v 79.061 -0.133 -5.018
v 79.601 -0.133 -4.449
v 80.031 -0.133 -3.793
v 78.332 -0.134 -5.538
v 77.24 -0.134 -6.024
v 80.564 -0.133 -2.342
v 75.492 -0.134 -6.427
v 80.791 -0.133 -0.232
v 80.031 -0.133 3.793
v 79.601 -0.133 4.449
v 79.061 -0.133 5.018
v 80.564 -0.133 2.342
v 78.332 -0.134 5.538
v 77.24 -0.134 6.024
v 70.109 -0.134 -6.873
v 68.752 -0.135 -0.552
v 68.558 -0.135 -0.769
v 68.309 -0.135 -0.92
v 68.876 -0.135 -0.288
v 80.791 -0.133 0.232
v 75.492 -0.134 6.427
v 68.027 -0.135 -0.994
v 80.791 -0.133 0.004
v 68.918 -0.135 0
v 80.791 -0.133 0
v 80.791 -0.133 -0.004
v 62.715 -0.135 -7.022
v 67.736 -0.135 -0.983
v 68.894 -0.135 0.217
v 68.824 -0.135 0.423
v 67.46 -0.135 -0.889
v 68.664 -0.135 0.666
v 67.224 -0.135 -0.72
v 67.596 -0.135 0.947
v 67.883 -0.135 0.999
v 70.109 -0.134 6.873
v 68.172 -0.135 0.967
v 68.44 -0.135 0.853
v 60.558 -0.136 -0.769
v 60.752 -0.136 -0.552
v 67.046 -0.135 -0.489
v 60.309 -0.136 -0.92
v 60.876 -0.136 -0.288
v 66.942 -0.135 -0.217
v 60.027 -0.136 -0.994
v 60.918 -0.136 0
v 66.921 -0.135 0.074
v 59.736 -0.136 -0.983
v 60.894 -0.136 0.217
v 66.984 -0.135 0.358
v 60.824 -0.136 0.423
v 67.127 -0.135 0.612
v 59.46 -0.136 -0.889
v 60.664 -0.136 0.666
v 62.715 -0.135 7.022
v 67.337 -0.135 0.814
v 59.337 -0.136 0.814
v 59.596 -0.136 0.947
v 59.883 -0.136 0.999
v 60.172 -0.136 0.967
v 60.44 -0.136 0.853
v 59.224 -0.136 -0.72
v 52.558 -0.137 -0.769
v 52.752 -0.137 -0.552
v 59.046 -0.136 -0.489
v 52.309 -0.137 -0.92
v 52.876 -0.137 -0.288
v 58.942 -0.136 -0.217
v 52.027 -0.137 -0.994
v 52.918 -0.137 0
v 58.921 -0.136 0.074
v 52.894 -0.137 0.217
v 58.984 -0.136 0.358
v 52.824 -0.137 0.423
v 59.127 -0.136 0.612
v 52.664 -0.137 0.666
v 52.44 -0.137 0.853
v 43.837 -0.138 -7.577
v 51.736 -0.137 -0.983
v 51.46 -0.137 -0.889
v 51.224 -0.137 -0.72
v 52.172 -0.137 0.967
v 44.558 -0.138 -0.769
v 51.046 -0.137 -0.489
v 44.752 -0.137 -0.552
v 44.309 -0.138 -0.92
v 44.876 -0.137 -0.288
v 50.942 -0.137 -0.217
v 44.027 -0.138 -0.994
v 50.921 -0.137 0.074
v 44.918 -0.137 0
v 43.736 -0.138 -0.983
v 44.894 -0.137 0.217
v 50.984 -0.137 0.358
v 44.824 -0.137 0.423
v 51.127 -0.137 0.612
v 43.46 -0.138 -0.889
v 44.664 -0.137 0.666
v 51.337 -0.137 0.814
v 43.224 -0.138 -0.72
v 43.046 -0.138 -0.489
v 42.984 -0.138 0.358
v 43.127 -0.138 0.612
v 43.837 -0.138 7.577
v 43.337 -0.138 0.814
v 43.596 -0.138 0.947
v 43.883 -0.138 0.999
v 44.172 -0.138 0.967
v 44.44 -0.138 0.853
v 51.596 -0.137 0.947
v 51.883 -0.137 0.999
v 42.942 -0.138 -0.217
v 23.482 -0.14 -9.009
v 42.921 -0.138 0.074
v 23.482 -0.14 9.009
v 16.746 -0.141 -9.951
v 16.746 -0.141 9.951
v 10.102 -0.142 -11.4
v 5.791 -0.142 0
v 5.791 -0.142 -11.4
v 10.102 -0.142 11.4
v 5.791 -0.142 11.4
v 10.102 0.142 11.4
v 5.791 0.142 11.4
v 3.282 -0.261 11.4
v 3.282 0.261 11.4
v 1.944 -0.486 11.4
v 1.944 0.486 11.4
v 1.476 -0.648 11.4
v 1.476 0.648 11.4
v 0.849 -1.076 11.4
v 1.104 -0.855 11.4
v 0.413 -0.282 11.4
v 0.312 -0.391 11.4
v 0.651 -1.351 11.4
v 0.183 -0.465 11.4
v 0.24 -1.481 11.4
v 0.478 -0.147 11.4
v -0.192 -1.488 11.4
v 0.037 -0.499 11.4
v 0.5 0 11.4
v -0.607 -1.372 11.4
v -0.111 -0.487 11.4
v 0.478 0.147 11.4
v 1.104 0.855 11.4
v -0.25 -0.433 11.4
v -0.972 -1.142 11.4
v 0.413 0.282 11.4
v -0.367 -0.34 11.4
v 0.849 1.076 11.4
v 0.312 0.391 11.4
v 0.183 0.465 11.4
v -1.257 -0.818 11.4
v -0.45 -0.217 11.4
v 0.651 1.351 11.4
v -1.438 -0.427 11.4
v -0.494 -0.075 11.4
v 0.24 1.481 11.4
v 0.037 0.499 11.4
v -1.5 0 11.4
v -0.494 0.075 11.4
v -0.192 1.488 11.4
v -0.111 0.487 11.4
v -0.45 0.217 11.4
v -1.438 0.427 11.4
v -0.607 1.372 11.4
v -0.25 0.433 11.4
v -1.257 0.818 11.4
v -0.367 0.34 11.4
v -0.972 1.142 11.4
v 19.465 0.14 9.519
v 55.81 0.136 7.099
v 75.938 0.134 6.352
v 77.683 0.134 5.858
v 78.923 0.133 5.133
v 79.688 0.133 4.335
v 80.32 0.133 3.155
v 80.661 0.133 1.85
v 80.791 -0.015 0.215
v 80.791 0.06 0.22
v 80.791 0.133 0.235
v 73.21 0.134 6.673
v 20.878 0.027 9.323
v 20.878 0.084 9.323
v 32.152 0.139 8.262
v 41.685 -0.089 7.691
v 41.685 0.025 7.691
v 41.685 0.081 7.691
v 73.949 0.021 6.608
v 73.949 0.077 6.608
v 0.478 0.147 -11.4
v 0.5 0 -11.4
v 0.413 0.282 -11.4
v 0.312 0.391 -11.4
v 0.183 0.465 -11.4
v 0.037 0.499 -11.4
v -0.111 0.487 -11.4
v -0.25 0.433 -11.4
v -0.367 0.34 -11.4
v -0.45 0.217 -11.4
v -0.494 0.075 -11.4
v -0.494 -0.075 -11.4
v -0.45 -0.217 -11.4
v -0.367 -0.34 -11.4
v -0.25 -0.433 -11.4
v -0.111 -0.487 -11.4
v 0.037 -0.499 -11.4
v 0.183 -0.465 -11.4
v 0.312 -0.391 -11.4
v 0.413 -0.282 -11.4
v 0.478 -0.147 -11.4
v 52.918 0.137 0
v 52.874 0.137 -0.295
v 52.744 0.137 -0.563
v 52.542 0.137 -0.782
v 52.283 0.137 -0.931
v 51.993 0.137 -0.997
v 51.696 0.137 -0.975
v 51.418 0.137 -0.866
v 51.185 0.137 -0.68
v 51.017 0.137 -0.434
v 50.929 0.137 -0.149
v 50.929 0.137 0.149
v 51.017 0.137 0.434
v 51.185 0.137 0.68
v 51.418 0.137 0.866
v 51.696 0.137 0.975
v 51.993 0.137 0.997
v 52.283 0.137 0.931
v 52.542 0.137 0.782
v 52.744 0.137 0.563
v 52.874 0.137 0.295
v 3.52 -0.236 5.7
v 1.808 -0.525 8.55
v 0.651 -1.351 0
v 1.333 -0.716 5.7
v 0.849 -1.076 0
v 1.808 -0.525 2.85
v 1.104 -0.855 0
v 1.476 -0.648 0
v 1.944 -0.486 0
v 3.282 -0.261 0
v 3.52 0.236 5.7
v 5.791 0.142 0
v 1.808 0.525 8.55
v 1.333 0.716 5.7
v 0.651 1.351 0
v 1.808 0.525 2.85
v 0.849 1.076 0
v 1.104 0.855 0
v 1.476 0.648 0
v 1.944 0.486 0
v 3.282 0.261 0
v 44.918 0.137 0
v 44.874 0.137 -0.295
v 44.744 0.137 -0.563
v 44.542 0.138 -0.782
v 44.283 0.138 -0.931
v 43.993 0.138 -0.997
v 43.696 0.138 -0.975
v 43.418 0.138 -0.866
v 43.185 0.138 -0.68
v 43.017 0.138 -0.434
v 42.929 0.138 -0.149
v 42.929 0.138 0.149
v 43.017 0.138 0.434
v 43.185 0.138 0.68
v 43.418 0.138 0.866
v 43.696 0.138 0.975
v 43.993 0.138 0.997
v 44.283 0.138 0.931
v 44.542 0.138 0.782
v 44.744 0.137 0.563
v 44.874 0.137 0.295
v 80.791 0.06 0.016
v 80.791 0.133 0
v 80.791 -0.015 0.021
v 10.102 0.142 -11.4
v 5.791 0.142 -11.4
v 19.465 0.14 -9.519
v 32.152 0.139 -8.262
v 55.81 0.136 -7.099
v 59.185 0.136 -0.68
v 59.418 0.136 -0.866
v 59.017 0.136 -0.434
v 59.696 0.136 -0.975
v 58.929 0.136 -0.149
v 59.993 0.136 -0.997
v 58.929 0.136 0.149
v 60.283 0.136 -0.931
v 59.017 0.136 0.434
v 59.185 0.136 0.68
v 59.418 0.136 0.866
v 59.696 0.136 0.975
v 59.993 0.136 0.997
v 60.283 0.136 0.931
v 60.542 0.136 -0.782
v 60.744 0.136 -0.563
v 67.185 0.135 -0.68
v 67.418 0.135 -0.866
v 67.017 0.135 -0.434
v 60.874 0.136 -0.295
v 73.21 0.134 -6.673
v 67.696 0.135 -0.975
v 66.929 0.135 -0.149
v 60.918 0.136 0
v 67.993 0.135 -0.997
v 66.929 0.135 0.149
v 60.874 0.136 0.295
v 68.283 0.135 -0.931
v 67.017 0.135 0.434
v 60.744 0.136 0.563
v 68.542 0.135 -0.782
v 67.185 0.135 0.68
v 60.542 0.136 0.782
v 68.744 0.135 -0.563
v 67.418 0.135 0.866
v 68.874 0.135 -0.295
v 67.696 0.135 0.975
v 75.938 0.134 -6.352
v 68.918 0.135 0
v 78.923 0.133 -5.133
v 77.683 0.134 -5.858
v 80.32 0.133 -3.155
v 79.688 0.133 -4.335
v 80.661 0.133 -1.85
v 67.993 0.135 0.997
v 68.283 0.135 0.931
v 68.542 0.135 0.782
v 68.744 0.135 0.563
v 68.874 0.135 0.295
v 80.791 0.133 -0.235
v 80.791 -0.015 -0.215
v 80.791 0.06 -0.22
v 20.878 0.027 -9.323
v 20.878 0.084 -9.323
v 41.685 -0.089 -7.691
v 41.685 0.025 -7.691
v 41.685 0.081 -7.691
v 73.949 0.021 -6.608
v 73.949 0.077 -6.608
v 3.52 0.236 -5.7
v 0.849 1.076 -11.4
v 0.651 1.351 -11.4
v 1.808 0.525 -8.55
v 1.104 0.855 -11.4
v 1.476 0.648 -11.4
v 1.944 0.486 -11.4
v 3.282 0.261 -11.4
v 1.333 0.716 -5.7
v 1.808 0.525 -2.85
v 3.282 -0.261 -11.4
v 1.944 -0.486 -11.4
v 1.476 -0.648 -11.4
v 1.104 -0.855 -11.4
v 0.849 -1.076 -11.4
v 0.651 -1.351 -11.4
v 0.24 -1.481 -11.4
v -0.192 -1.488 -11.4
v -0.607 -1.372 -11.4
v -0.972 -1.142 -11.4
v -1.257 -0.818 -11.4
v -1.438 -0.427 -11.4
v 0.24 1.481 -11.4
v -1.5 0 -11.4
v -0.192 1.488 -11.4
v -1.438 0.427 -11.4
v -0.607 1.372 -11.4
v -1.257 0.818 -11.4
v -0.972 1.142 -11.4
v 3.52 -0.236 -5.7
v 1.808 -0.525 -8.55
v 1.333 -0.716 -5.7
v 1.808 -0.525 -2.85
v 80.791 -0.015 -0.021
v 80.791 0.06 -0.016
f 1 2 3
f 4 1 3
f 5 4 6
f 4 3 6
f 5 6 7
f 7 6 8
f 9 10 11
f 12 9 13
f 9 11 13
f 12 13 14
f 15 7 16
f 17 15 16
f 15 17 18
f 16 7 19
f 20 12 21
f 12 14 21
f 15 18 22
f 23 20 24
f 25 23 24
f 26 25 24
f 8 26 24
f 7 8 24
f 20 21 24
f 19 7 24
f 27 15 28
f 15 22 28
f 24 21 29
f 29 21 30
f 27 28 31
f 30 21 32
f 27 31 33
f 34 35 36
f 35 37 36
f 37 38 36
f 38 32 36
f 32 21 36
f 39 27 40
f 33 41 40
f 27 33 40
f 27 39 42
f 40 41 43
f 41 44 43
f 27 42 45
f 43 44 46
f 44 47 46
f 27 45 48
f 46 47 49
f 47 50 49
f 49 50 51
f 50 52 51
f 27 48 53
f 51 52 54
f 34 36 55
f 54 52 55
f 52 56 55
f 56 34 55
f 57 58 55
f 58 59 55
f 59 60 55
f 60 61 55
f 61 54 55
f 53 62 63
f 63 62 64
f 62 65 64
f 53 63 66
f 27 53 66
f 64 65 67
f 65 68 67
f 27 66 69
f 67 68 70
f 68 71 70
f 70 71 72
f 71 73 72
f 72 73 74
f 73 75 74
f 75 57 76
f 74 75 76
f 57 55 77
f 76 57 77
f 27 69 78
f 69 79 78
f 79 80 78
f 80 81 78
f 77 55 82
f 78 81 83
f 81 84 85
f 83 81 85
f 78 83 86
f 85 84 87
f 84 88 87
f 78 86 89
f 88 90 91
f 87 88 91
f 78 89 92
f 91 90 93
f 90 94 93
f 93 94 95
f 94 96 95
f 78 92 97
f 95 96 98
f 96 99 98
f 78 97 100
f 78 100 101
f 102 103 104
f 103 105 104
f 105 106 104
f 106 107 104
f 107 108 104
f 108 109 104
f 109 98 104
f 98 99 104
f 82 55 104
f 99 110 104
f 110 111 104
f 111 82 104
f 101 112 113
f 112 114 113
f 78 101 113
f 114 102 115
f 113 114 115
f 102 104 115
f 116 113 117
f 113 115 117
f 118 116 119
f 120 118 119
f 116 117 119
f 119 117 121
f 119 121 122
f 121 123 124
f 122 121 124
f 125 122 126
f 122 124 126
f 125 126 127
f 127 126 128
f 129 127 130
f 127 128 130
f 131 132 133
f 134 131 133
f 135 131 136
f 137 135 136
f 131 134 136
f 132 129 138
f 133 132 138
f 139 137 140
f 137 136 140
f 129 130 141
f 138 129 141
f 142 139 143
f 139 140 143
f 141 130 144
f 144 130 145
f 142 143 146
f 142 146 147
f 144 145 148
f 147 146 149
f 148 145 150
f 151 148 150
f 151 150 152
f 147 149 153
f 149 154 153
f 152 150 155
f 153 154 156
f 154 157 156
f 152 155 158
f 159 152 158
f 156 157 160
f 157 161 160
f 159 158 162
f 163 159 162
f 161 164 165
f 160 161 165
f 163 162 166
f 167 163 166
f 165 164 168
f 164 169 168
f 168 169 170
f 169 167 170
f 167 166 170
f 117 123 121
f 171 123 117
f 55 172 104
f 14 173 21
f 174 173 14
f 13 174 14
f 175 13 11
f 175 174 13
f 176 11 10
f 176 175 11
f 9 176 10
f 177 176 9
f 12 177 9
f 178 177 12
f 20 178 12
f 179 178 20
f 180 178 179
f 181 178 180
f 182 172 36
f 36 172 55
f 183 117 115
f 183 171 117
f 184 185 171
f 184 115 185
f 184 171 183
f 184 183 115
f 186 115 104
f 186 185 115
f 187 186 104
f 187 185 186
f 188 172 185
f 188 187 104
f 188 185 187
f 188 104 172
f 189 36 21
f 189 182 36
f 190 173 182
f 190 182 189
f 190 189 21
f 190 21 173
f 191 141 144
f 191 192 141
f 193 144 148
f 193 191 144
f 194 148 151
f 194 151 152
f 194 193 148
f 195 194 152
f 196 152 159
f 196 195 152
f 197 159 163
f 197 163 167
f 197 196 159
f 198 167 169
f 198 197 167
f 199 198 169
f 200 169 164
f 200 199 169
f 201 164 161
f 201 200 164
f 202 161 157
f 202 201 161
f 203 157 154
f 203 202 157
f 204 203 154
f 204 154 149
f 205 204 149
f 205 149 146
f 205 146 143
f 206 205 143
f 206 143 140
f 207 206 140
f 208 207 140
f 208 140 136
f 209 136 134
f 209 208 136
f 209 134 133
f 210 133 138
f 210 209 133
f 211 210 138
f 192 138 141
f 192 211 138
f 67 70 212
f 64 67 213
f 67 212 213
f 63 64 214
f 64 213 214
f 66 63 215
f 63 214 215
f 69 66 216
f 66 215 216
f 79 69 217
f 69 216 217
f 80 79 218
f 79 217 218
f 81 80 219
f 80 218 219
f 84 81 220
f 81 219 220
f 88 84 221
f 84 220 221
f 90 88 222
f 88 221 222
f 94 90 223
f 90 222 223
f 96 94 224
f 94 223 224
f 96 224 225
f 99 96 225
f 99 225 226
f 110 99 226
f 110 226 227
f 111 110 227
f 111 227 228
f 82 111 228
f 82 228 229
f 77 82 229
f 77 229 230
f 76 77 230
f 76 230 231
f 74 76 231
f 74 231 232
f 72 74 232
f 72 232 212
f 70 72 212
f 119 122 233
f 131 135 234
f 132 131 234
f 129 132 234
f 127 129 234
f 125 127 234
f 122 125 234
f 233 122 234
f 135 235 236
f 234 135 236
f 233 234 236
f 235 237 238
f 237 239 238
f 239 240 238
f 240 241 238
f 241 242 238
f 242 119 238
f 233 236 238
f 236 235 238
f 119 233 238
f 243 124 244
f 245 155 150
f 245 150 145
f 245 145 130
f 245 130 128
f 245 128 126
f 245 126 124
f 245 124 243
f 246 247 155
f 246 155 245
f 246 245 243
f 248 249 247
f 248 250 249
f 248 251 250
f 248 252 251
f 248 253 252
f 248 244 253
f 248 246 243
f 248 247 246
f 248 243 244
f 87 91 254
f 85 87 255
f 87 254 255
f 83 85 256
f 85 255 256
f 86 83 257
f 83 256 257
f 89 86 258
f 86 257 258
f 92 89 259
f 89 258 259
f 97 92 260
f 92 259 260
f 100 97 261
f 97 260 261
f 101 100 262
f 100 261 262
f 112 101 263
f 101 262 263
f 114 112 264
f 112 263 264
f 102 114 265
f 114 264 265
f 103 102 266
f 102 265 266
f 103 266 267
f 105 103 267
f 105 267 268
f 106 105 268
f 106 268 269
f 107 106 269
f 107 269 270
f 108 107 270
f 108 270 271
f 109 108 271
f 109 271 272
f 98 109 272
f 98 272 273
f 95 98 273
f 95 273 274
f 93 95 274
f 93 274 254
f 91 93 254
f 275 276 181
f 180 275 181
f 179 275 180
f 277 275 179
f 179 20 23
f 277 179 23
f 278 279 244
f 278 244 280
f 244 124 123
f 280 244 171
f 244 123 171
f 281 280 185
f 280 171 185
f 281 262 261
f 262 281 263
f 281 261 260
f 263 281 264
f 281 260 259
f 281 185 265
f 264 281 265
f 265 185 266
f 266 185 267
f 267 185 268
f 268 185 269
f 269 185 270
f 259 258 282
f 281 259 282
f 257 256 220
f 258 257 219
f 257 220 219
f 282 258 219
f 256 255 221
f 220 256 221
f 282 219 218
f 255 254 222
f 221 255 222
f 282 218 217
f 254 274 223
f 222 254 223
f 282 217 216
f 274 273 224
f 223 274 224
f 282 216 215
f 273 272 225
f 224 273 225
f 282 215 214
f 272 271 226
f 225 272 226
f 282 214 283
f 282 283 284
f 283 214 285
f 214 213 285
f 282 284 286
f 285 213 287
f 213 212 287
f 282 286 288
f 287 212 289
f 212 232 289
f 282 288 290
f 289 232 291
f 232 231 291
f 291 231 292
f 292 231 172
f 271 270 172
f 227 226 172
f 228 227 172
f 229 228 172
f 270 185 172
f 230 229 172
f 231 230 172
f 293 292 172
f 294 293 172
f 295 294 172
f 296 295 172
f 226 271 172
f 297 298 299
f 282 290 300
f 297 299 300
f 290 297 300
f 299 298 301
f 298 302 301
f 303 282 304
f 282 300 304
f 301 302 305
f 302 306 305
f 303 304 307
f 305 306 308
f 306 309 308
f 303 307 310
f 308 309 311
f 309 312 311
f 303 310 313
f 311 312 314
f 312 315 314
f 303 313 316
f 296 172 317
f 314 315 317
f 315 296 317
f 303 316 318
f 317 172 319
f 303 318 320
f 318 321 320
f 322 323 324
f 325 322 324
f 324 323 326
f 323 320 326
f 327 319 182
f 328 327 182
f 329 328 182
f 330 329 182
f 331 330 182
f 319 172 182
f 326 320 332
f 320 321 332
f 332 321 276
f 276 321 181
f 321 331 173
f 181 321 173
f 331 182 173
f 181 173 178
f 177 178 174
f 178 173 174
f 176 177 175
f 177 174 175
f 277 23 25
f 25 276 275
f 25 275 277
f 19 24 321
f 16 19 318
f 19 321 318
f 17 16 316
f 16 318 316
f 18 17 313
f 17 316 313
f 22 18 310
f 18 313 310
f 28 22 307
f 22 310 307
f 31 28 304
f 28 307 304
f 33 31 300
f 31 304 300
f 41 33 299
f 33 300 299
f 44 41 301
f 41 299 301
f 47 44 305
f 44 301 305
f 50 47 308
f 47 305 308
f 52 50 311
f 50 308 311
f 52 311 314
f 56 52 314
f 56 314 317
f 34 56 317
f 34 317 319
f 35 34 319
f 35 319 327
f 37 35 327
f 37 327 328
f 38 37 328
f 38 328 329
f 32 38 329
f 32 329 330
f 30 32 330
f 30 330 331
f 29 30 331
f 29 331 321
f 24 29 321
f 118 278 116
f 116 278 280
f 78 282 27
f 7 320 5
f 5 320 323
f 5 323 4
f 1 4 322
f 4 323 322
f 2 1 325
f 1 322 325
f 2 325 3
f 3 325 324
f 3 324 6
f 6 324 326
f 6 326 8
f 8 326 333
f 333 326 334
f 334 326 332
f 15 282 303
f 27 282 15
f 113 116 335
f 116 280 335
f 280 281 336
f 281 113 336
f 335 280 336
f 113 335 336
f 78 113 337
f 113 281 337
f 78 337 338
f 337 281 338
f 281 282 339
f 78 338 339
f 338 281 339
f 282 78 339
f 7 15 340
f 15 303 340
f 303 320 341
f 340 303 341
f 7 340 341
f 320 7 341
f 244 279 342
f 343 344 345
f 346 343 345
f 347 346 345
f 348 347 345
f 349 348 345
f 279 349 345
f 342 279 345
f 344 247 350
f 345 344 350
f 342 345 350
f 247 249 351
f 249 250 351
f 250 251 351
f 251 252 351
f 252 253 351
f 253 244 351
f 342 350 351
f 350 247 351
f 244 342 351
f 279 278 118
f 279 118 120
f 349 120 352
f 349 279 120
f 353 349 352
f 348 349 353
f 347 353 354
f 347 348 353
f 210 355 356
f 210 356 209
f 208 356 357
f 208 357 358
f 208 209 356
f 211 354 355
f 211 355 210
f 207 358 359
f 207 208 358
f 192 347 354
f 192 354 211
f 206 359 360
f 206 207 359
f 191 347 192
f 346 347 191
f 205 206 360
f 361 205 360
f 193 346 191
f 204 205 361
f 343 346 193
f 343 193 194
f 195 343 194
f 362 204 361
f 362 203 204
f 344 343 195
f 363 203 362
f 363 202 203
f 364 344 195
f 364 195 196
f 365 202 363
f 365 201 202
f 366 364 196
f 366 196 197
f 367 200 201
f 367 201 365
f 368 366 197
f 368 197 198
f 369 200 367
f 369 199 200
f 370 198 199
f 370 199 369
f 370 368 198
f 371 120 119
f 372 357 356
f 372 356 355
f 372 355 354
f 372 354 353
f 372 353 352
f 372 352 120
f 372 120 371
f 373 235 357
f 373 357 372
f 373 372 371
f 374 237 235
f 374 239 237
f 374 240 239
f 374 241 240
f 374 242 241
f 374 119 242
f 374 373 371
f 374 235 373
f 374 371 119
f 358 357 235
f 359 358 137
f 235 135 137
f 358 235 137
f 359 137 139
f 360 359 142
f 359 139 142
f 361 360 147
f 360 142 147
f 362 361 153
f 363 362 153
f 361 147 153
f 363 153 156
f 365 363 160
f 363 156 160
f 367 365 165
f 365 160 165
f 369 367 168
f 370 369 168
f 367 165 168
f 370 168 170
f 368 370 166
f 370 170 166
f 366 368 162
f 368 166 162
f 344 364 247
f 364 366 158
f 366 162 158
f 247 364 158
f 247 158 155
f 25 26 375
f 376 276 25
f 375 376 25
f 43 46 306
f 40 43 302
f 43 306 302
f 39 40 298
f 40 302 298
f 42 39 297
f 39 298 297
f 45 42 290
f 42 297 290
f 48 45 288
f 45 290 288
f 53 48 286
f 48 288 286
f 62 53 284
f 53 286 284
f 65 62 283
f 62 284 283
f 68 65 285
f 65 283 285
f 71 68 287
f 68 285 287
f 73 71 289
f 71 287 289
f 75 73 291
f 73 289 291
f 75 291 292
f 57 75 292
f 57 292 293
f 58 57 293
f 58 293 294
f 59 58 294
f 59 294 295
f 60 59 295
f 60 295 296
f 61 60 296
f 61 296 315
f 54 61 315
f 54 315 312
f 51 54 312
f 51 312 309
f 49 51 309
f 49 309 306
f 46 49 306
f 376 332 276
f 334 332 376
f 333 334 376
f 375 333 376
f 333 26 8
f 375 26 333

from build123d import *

# Parameters (mm, degrees)
ESQUISSE2_R                  = 0.5
BOSS_EXTRU_1_DEPTH           = 11.4
BOSS_EXTRU_1_DEPTH_BACK      = 11.4
ENL_V_MAT_EXTRU_1_DEPTH      = 2.3667646
ENL_V_MAT_EXTRU_1_DEPTH_BACK = 2.642922663
ESQUISSE4_R                  = 1
ENL_V_MAT_EXTRU_2_DEPTH      = 10


with BuildPart() as part:
    # Esquisse2 → Boss.-Extru.1 (new body, two sides)
    with BuildSketch(Plane.XY) as boss_extru_1_sk:
        with BuildLine():
            Line((5.791060422, 0.142064292), (80.791060422, 0.133235508))
            ThreePointArc((80.791060422, 0.133235508), (80.791208073, 0), (80.791060422, -0.133235508))
            Line((80.791060422, -0.133235508), (5.791060422, -0.142064292))
            add(Edge.make_bspline(
                [(0.650938463, -1.351398948), (1.114517622, -0.510365175), (3.069897688, -0.268204079), (5.029284194, -0.087299538), (5.791060422, -0.142064292)],
                knots=[0, 0, 0, 0, 0.614720571, 1, 1, 1, 1], degree=3))
            ThreePointArc((0.650938463, -1.351398948), (-1.5, 0), (0.650938463, 1.351398948))
            add(Edge.make_bspline(
                [(0.650938463, 1.351398948), (1.114517622, 0.510365175), (3.069897688, 0.268204079), (5.029284194, 0.087299538), (5.791060422, 0.142064292)],
                knots=[0, 0, 0, 0, 0.614720571, 1, 1, 1, 1], degree=3))
        make_face()
        Circle(ESQUISSE2_R, mode=Mode.SUBTRACT)
    extrude(amount=BOSS_EXTRU_1_DEPTH)
    extrude(boss_extru_1_sk.sketch, amount=-BOSS_EXTRU_1_DEPTH_BACK)

    # Esquisse3 → Enlèv. mat.-Extru.1 (cut, two sides)
    with BuildSketch(Plane(origin=(1.6804e-05, 0.142745997, 0), x_dir=(0.999999993, -0.000117717, 0), z_dir=(0.000117717, 0.999999993, 0))) as enl_v_mat_extru_1_sk:
        with BuildLine():
            Line((10.102155287, -11.4), (10.102155287, -17.099052468))
            Line((10.102155287, -17.099052468), (86.344524323, -17.099052468))
            Line((86.344524323, -17.099052468), (86.344524323, 15.270652799))
            Line((86.344524323, 15.270652799), (10.102155287, 15.270652799))
            Line((10.102155287, 15.270652799), (10.102155287, 11.4))
            add(Edge.make_bspline(
                [(10.102155287, 11.4), (17.187955459, 9.505905963), (27.807117465, 8.474072417), (44.021133961, 7.54546899), (58.105257919, 6.872044623), (72.14311084, 7.164739919), (80.839785674, 5.702525327), (80.791044178, 0)],
                knots=[0, 0, 0, 0, 0.29559869, 0.428617279, 0.656429752, 0.863093906, 1, 1, 1, 1], degree=3))
            add(Edge.make_bspline(
                [(10.102155287, -11.4), (17.187955459, -9.505905963), (27.807117465, -8.474072417), (44.021133961, -7.54546899), (58.105257919, -6.872044623), (72.14311084, -7.164739919), (80.839785674, -5.702525327), (80.791044178, 0)],
                knots=[0, 0, 0, 0, 0.29559869, 0.428617279, 0.656429752, 0.863093906, 1, 1, 1, 1], degree=3))
        make_face()
    extrude(amount=ENL_V_MAT_EXTRU_1_DEPTH, mode=Mode.SUBTRACT)
    extrude(enl_v_mat_extru_1_sk.sketch, amount=-ENL_V_MAT_EXTRU_1_DEPTH_BACK, mode=Mode.SUBTRACT)

    # Esquisse4 → Enlèv. mat.-Extru.2 (cut)
    with BuildSketch(Plane(origin=(1.6804e-05, 0.142745997, 0), x_dir=(0.999999993, -0.000117717, 0), z_dir=(0.000117717, 0.999999993, 0))):
        with Locations((67.918028656, 0)):
            Circle(ESQUISSE4_R)
        with Locations((59.918028656, 0)):
            Circle(ESQUISSE4_R)
        with Locations((51.918028656, 0)):
            Circle(ESQUISSE4_R)
        with Locations((43.918028656, 0)):
            Circle(ESQUISSE4_R)
    extrude(amount=-ENL_V_MAT_EXTRU_2_DEPTH, mode=Mode.SUBTRACT)


solid = part.part
